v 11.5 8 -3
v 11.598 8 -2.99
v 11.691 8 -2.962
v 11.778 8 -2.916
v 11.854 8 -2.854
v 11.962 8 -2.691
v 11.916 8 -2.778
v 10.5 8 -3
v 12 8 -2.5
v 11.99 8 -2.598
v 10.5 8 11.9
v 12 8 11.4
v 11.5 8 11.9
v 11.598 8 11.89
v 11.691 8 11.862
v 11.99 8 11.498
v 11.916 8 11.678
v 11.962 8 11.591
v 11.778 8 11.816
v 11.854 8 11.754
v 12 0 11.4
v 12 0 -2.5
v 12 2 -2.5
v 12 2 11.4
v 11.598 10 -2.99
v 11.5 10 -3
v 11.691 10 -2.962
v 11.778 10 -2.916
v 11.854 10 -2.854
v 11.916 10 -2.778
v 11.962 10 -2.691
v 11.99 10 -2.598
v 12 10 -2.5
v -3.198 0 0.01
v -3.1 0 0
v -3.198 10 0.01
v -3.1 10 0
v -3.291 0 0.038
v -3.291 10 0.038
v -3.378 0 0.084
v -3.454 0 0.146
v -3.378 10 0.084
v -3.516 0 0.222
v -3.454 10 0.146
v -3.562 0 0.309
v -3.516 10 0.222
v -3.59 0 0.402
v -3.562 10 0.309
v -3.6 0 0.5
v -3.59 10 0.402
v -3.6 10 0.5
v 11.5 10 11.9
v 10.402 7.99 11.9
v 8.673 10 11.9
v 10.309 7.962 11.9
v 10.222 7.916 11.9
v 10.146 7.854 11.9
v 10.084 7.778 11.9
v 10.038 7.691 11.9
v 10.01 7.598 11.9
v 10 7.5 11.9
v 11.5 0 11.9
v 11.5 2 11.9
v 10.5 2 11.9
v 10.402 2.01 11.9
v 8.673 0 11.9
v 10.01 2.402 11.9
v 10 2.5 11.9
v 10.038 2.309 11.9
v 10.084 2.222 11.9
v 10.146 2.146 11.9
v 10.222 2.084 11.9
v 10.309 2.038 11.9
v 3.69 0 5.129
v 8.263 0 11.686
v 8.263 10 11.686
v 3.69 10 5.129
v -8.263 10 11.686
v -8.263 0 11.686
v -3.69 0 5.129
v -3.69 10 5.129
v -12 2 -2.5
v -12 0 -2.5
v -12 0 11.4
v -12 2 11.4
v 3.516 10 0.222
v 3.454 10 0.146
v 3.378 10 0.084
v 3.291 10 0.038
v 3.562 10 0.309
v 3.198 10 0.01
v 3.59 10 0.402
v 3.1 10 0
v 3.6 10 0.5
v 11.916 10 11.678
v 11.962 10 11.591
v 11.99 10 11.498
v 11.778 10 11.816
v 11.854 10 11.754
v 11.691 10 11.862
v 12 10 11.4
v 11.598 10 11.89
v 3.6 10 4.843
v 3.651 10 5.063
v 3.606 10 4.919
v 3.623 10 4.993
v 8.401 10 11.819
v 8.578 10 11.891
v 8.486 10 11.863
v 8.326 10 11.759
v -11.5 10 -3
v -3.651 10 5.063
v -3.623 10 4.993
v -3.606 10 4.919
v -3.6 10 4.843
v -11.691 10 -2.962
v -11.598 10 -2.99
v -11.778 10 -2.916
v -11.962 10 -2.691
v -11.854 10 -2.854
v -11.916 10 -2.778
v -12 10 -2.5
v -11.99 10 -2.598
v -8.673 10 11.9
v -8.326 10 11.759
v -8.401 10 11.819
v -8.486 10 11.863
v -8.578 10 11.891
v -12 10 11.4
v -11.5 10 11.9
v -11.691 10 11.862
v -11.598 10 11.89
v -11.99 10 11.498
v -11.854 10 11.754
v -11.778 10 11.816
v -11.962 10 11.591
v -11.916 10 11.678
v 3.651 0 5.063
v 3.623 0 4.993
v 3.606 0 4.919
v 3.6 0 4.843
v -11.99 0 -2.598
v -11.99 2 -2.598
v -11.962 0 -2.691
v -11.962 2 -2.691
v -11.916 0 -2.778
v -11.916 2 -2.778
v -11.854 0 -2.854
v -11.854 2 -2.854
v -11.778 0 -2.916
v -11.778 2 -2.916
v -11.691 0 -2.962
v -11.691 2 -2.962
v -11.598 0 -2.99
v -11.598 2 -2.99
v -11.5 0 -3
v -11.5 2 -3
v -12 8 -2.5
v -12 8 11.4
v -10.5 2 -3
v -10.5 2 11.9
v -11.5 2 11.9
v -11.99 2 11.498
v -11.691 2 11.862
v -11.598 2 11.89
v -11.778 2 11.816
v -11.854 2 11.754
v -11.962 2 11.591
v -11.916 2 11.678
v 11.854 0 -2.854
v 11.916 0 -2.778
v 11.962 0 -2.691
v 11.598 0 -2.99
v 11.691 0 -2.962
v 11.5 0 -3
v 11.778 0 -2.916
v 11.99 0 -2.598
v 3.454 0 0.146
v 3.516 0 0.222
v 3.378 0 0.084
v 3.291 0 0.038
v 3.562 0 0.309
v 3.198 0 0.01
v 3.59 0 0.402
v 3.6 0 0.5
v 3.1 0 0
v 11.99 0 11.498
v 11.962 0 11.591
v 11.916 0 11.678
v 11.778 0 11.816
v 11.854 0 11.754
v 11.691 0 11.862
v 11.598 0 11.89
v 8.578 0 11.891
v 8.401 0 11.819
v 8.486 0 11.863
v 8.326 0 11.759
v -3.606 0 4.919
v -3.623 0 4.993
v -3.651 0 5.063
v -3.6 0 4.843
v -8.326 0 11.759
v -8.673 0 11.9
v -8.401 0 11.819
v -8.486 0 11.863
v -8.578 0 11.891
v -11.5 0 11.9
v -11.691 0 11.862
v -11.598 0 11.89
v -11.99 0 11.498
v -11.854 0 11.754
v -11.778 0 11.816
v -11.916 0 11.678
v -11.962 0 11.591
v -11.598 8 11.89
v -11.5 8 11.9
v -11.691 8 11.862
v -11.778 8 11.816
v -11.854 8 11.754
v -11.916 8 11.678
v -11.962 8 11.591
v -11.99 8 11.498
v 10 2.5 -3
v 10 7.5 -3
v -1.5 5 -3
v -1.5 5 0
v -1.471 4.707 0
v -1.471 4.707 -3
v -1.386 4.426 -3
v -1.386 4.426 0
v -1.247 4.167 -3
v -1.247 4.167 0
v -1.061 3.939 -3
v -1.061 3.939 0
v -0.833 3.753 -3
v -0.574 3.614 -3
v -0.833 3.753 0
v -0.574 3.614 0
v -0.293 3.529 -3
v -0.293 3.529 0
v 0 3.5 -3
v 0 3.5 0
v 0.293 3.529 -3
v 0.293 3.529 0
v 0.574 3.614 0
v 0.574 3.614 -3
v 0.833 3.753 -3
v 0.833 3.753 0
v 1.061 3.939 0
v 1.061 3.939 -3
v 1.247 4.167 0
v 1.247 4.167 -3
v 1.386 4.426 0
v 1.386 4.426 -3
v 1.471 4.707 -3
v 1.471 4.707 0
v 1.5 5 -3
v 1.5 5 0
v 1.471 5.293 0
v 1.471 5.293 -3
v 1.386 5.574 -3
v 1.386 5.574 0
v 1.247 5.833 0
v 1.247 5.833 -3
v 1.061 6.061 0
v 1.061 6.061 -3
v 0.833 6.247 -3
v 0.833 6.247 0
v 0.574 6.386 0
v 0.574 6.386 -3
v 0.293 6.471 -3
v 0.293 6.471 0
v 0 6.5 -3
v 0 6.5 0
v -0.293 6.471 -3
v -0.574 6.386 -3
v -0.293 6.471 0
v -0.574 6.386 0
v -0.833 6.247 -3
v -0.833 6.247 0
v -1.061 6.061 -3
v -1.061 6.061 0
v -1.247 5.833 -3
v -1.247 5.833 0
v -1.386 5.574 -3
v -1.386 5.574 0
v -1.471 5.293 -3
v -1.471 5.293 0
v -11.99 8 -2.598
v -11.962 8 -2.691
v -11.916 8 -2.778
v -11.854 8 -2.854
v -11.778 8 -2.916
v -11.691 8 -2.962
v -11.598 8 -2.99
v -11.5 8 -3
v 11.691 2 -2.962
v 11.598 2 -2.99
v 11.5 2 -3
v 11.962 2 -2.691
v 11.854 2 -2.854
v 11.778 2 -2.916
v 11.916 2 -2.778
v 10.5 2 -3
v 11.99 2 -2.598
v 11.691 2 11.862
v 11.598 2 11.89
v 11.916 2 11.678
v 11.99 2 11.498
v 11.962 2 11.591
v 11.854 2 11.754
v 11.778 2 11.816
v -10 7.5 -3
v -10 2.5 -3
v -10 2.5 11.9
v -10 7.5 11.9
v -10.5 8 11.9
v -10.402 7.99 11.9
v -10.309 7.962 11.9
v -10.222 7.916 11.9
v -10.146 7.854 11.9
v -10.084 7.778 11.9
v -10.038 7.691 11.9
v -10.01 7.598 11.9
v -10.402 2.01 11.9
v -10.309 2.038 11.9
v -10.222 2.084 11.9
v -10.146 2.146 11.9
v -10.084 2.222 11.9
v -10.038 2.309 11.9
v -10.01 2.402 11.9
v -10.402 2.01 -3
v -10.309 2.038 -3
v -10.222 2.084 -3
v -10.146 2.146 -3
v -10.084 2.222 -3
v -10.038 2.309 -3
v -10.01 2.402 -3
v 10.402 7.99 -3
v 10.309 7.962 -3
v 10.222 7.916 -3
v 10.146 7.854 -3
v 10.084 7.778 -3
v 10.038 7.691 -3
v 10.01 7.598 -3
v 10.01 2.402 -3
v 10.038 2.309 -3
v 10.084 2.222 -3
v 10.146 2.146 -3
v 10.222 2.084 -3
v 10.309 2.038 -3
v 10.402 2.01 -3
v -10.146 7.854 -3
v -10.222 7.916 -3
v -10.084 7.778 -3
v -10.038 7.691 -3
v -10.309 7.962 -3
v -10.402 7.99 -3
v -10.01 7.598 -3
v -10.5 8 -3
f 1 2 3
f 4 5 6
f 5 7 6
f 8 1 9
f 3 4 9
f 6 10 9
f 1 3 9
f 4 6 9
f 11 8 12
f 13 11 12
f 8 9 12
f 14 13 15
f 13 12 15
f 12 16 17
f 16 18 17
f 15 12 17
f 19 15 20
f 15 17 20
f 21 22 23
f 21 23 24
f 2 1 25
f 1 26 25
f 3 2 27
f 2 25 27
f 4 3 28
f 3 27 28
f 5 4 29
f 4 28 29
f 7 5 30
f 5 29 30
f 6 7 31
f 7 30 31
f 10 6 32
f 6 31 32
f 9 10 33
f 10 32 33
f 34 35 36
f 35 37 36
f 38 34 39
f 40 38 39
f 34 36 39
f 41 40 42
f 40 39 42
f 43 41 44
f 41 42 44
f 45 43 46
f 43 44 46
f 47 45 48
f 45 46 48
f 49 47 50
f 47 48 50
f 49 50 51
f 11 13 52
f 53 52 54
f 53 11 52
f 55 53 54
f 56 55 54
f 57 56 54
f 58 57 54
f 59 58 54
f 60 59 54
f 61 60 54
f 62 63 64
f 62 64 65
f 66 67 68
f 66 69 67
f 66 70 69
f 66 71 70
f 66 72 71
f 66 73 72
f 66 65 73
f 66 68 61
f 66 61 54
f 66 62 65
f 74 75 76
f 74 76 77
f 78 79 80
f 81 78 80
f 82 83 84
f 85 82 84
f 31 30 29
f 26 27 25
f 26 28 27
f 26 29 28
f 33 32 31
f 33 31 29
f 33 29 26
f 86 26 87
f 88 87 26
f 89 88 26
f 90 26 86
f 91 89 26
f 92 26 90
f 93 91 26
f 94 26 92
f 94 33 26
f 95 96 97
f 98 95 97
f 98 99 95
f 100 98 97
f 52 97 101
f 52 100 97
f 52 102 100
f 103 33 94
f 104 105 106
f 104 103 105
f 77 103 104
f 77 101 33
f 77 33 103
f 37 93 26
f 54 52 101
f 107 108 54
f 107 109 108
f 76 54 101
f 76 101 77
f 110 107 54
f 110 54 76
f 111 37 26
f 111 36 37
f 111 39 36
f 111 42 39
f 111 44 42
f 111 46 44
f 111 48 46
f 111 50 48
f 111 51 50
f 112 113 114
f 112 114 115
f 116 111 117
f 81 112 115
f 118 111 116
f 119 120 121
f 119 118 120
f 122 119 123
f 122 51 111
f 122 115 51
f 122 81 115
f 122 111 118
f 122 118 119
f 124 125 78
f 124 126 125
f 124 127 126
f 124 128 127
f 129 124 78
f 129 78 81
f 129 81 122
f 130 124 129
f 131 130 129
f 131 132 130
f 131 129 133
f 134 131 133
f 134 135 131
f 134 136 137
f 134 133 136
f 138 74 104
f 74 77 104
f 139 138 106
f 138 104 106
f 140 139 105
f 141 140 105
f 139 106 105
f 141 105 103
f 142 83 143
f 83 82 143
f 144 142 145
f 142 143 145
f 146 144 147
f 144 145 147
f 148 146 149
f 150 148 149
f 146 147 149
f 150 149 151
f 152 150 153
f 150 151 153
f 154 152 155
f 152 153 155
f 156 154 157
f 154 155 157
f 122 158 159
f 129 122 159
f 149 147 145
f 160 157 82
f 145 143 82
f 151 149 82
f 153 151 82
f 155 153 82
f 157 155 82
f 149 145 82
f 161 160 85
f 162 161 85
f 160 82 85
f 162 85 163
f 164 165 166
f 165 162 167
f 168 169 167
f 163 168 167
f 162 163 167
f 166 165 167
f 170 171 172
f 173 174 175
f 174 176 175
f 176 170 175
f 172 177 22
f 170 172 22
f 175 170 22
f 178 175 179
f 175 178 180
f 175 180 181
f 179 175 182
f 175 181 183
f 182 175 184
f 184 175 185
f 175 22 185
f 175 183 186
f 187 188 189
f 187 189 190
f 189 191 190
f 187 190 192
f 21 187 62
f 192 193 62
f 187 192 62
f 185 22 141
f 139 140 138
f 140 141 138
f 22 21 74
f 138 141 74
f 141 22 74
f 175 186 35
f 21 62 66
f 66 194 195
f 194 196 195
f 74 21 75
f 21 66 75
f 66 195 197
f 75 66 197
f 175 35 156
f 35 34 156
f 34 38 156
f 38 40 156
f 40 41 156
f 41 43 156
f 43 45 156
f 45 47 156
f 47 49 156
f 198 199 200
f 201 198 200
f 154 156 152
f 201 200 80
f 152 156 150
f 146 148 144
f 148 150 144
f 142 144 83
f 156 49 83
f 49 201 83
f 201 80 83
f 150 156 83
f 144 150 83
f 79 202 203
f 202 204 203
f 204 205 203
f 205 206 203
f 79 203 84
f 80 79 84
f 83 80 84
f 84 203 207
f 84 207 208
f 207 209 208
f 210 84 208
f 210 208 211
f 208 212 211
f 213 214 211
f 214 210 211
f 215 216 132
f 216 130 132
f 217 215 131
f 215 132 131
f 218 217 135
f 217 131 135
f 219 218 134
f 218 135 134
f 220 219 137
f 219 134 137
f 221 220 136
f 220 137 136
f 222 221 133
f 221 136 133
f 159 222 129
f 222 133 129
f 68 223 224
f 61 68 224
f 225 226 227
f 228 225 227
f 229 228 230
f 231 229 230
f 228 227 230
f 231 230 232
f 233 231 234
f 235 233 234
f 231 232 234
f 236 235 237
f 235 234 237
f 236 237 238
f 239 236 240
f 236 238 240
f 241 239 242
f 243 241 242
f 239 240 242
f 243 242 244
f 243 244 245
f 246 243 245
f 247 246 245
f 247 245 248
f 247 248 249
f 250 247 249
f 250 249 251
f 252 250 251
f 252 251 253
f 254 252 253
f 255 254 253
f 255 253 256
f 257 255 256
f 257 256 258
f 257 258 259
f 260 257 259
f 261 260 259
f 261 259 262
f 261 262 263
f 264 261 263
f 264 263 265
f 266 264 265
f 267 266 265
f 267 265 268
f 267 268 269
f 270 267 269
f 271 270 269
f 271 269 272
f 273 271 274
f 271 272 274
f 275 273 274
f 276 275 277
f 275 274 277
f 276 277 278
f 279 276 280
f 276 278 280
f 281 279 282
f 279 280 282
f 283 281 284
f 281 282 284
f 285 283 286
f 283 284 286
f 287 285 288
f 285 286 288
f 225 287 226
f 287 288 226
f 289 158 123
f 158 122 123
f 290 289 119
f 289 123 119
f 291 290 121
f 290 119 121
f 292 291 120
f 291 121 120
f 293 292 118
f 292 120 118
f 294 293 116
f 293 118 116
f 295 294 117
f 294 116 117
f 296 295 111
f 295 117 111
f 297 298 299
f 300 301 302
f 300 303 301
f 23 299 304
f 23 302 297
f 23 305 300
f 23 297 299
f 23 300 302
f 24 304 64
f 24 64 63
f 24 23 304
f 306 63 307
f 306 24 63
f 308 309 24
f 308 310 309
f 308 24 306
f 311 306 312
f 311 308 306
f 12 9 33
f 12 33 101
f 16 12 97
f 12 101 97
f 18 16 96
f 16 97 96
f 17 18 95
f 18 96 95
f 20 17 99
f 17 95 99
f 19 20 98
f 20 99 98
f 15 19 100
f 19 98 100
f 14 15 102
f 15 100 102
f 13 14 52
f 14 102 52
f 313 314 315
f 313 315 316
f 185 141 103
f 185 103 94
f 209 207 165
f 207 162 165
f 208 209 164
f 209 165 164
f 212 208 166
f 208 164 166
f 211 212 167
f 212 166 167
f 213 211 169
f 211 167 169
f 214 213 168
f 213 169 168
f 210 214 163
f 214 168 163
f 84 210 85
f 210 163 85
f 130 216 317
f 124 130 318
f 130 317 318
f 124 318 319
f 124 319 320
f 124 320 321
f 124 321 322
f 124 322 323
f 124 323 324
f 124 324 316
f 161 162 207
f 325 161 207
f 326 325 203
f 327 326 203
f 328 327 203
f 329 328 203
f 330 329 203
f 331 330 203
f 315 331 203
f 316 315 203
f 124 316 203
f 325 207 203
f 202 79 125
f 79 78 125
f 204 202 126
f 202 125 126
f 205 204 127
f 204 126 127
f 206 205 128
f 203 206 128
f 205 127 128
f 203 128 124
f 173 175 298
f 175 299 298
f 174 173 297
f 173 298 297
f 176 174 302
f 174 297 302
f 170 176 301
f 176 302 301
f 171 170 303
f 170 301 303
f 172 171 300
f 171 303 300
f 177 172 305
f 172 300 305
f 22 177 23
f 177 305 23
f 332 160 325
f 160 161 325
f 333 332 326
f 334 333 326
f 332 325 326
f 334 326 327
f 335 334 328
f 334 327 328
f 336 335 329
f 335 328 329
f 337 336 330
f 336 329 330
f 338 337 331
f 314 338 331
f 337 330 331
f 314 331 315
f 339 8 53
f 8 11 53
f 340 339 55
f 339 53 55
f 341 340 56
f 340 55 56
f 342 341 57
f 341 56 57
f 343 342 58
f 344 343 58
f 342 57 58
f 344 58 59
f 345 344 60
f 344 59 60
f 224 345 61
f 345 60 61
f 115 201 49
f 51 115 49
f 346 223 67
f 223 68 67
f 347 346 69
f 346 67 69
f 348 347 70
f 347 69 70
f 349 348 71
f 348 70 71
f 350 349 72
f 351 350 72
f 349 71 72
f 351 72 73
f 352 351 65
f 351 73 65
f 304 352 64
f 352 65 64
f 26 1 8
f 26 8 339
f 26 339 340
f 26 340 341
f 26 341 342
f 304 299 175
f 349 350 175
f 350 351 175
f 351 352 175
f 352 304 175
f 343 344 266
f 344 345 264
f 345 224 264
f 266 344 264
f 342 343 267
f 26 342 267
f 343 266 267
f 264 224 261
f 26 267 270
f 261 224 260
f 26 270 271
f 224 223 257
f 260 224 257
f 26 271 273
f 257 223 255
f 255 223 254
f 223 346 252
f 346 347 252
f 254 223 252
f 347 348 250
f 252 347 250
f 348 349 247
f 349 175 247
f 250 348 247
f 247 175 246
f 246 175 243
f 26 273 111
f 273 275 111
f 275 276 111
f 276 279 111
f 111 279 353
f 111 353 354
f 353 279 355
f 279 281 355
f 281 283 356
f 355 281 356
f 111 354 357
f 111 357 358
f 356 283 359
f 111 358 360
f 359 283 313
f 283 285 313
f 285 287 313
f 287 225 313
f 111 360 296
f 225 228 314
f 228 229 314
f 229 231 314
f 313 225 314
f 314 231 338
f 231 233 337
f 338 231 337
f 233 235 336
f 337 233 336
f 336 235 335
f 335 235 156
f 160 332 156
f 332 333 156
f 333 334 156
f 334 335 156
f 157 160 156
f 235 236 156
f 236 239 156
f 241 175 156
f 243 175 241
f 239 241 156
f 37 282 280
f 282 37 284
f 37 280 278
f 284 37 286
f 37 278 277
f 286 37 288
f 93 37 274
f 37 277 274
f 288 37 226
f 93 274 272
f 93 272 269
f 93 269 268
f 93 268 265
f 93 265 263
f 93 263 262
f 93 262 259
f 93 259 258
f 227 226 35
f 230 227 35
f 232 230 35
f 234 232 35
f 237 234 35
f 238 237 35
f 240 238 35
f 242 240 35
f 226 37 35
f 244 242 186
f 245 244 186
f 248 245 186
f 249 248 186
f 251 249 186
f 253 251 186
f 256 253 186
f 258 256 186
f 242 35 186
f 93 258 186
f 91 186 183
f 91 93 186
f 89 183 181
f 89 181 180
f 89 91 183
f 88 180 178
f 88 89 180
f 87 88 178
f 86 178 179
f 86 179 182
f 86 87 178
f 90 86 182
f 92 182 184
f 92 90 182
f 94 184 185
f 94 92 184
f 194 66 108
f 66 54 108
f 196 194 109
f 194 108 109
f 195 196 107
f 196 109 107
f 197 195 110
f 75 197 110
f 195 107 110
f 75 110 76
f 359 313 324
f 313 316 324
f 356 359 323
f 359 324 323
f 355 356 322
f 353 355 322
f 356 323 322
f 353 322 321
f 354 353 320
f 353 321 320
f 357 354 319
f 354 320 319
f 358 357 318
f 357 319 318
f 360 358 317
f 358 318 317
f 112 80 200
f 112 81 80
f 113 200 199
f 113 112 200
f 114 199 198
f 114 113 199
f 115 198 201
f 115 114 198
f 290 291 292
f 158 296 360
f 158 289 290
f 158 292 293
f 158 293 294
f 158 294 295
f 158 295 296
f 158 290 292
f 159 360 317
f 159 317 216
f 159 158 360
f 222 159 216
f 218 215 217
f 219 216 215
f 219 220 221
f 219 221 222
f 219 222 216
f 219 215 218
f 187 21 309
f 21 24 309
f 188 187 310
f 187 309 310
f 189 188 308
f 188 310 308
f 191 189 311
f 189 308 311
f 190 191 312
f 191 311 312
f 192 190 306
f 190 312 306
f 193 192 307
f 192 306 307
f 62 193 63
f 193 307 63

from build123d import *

# Parameters (mm, degrees)
F1_DEPTH = 10
F2_W     = 6
F2_H     = 14.9
F3_DEPTH = 2
F5_R     = 0.5
F7_D     = 3


with BuildPart() as f1:
    # F0 (on Front) → F1 (new body)
    with BuildSketch(Plane.XZ):
        Polygon((3.6, 0), (0, 0), (0, -3), (12, -3), (12, 11.9), (8.4125, 11.9), (3.6, 5), align=None)
    extrude(amount=-F1_DEPTH)

    # F2 (on face) → F3 (cut)
    with BuildSketch(Plane.YZ.offset(12)):
        with Locations((5, 4.45)):
            Rectangle(F2_W, F2_H)
    extrude(amount=-F3_DEPTH, mode=Mode.SUBTRACT)

    # F4: F1 across plane


with BuildPart() as f1_1:
    add(f1.part)
    add(f1.part.mirror(Plane.YZ))

    # F5
    f5_edges = [f1_1.edges().sort_by_distance(p)[0] for p in [
        (-8.4125, 5, 11.9),
        (-12, 1, 11.9),
        (-12, 9, 11.9),
        (-3.6, 5, 5),
        (-3.6, 5, 0),
        (3.6, 5, 0),
        (3.6, 5, 5),
        (8.4125, 5, 11.9),
        (12, 9, 11.9),
        (12, 1, 11.9),
        (12, 9, -3),
        (12, 1, -3),
        (-12, 1, -3),
        (-12, 9, -3),
        (10, 8, 4.45),
        (10, 2, 4.45),
        (-10, 2, 4.45),
        (-10, 8, 4.45),
    ]]
    fillet(f5_edges, radius=F5_R)

    # F7 (through all)
    with Locations(Plane(origin=(0, 0, -3), x_dir=(1, 0, 0), z_dir=(0, 0, -1))):
        with Locations((0, -5)):
            Hole(F7_D / 2)


solid = f1_1.part
